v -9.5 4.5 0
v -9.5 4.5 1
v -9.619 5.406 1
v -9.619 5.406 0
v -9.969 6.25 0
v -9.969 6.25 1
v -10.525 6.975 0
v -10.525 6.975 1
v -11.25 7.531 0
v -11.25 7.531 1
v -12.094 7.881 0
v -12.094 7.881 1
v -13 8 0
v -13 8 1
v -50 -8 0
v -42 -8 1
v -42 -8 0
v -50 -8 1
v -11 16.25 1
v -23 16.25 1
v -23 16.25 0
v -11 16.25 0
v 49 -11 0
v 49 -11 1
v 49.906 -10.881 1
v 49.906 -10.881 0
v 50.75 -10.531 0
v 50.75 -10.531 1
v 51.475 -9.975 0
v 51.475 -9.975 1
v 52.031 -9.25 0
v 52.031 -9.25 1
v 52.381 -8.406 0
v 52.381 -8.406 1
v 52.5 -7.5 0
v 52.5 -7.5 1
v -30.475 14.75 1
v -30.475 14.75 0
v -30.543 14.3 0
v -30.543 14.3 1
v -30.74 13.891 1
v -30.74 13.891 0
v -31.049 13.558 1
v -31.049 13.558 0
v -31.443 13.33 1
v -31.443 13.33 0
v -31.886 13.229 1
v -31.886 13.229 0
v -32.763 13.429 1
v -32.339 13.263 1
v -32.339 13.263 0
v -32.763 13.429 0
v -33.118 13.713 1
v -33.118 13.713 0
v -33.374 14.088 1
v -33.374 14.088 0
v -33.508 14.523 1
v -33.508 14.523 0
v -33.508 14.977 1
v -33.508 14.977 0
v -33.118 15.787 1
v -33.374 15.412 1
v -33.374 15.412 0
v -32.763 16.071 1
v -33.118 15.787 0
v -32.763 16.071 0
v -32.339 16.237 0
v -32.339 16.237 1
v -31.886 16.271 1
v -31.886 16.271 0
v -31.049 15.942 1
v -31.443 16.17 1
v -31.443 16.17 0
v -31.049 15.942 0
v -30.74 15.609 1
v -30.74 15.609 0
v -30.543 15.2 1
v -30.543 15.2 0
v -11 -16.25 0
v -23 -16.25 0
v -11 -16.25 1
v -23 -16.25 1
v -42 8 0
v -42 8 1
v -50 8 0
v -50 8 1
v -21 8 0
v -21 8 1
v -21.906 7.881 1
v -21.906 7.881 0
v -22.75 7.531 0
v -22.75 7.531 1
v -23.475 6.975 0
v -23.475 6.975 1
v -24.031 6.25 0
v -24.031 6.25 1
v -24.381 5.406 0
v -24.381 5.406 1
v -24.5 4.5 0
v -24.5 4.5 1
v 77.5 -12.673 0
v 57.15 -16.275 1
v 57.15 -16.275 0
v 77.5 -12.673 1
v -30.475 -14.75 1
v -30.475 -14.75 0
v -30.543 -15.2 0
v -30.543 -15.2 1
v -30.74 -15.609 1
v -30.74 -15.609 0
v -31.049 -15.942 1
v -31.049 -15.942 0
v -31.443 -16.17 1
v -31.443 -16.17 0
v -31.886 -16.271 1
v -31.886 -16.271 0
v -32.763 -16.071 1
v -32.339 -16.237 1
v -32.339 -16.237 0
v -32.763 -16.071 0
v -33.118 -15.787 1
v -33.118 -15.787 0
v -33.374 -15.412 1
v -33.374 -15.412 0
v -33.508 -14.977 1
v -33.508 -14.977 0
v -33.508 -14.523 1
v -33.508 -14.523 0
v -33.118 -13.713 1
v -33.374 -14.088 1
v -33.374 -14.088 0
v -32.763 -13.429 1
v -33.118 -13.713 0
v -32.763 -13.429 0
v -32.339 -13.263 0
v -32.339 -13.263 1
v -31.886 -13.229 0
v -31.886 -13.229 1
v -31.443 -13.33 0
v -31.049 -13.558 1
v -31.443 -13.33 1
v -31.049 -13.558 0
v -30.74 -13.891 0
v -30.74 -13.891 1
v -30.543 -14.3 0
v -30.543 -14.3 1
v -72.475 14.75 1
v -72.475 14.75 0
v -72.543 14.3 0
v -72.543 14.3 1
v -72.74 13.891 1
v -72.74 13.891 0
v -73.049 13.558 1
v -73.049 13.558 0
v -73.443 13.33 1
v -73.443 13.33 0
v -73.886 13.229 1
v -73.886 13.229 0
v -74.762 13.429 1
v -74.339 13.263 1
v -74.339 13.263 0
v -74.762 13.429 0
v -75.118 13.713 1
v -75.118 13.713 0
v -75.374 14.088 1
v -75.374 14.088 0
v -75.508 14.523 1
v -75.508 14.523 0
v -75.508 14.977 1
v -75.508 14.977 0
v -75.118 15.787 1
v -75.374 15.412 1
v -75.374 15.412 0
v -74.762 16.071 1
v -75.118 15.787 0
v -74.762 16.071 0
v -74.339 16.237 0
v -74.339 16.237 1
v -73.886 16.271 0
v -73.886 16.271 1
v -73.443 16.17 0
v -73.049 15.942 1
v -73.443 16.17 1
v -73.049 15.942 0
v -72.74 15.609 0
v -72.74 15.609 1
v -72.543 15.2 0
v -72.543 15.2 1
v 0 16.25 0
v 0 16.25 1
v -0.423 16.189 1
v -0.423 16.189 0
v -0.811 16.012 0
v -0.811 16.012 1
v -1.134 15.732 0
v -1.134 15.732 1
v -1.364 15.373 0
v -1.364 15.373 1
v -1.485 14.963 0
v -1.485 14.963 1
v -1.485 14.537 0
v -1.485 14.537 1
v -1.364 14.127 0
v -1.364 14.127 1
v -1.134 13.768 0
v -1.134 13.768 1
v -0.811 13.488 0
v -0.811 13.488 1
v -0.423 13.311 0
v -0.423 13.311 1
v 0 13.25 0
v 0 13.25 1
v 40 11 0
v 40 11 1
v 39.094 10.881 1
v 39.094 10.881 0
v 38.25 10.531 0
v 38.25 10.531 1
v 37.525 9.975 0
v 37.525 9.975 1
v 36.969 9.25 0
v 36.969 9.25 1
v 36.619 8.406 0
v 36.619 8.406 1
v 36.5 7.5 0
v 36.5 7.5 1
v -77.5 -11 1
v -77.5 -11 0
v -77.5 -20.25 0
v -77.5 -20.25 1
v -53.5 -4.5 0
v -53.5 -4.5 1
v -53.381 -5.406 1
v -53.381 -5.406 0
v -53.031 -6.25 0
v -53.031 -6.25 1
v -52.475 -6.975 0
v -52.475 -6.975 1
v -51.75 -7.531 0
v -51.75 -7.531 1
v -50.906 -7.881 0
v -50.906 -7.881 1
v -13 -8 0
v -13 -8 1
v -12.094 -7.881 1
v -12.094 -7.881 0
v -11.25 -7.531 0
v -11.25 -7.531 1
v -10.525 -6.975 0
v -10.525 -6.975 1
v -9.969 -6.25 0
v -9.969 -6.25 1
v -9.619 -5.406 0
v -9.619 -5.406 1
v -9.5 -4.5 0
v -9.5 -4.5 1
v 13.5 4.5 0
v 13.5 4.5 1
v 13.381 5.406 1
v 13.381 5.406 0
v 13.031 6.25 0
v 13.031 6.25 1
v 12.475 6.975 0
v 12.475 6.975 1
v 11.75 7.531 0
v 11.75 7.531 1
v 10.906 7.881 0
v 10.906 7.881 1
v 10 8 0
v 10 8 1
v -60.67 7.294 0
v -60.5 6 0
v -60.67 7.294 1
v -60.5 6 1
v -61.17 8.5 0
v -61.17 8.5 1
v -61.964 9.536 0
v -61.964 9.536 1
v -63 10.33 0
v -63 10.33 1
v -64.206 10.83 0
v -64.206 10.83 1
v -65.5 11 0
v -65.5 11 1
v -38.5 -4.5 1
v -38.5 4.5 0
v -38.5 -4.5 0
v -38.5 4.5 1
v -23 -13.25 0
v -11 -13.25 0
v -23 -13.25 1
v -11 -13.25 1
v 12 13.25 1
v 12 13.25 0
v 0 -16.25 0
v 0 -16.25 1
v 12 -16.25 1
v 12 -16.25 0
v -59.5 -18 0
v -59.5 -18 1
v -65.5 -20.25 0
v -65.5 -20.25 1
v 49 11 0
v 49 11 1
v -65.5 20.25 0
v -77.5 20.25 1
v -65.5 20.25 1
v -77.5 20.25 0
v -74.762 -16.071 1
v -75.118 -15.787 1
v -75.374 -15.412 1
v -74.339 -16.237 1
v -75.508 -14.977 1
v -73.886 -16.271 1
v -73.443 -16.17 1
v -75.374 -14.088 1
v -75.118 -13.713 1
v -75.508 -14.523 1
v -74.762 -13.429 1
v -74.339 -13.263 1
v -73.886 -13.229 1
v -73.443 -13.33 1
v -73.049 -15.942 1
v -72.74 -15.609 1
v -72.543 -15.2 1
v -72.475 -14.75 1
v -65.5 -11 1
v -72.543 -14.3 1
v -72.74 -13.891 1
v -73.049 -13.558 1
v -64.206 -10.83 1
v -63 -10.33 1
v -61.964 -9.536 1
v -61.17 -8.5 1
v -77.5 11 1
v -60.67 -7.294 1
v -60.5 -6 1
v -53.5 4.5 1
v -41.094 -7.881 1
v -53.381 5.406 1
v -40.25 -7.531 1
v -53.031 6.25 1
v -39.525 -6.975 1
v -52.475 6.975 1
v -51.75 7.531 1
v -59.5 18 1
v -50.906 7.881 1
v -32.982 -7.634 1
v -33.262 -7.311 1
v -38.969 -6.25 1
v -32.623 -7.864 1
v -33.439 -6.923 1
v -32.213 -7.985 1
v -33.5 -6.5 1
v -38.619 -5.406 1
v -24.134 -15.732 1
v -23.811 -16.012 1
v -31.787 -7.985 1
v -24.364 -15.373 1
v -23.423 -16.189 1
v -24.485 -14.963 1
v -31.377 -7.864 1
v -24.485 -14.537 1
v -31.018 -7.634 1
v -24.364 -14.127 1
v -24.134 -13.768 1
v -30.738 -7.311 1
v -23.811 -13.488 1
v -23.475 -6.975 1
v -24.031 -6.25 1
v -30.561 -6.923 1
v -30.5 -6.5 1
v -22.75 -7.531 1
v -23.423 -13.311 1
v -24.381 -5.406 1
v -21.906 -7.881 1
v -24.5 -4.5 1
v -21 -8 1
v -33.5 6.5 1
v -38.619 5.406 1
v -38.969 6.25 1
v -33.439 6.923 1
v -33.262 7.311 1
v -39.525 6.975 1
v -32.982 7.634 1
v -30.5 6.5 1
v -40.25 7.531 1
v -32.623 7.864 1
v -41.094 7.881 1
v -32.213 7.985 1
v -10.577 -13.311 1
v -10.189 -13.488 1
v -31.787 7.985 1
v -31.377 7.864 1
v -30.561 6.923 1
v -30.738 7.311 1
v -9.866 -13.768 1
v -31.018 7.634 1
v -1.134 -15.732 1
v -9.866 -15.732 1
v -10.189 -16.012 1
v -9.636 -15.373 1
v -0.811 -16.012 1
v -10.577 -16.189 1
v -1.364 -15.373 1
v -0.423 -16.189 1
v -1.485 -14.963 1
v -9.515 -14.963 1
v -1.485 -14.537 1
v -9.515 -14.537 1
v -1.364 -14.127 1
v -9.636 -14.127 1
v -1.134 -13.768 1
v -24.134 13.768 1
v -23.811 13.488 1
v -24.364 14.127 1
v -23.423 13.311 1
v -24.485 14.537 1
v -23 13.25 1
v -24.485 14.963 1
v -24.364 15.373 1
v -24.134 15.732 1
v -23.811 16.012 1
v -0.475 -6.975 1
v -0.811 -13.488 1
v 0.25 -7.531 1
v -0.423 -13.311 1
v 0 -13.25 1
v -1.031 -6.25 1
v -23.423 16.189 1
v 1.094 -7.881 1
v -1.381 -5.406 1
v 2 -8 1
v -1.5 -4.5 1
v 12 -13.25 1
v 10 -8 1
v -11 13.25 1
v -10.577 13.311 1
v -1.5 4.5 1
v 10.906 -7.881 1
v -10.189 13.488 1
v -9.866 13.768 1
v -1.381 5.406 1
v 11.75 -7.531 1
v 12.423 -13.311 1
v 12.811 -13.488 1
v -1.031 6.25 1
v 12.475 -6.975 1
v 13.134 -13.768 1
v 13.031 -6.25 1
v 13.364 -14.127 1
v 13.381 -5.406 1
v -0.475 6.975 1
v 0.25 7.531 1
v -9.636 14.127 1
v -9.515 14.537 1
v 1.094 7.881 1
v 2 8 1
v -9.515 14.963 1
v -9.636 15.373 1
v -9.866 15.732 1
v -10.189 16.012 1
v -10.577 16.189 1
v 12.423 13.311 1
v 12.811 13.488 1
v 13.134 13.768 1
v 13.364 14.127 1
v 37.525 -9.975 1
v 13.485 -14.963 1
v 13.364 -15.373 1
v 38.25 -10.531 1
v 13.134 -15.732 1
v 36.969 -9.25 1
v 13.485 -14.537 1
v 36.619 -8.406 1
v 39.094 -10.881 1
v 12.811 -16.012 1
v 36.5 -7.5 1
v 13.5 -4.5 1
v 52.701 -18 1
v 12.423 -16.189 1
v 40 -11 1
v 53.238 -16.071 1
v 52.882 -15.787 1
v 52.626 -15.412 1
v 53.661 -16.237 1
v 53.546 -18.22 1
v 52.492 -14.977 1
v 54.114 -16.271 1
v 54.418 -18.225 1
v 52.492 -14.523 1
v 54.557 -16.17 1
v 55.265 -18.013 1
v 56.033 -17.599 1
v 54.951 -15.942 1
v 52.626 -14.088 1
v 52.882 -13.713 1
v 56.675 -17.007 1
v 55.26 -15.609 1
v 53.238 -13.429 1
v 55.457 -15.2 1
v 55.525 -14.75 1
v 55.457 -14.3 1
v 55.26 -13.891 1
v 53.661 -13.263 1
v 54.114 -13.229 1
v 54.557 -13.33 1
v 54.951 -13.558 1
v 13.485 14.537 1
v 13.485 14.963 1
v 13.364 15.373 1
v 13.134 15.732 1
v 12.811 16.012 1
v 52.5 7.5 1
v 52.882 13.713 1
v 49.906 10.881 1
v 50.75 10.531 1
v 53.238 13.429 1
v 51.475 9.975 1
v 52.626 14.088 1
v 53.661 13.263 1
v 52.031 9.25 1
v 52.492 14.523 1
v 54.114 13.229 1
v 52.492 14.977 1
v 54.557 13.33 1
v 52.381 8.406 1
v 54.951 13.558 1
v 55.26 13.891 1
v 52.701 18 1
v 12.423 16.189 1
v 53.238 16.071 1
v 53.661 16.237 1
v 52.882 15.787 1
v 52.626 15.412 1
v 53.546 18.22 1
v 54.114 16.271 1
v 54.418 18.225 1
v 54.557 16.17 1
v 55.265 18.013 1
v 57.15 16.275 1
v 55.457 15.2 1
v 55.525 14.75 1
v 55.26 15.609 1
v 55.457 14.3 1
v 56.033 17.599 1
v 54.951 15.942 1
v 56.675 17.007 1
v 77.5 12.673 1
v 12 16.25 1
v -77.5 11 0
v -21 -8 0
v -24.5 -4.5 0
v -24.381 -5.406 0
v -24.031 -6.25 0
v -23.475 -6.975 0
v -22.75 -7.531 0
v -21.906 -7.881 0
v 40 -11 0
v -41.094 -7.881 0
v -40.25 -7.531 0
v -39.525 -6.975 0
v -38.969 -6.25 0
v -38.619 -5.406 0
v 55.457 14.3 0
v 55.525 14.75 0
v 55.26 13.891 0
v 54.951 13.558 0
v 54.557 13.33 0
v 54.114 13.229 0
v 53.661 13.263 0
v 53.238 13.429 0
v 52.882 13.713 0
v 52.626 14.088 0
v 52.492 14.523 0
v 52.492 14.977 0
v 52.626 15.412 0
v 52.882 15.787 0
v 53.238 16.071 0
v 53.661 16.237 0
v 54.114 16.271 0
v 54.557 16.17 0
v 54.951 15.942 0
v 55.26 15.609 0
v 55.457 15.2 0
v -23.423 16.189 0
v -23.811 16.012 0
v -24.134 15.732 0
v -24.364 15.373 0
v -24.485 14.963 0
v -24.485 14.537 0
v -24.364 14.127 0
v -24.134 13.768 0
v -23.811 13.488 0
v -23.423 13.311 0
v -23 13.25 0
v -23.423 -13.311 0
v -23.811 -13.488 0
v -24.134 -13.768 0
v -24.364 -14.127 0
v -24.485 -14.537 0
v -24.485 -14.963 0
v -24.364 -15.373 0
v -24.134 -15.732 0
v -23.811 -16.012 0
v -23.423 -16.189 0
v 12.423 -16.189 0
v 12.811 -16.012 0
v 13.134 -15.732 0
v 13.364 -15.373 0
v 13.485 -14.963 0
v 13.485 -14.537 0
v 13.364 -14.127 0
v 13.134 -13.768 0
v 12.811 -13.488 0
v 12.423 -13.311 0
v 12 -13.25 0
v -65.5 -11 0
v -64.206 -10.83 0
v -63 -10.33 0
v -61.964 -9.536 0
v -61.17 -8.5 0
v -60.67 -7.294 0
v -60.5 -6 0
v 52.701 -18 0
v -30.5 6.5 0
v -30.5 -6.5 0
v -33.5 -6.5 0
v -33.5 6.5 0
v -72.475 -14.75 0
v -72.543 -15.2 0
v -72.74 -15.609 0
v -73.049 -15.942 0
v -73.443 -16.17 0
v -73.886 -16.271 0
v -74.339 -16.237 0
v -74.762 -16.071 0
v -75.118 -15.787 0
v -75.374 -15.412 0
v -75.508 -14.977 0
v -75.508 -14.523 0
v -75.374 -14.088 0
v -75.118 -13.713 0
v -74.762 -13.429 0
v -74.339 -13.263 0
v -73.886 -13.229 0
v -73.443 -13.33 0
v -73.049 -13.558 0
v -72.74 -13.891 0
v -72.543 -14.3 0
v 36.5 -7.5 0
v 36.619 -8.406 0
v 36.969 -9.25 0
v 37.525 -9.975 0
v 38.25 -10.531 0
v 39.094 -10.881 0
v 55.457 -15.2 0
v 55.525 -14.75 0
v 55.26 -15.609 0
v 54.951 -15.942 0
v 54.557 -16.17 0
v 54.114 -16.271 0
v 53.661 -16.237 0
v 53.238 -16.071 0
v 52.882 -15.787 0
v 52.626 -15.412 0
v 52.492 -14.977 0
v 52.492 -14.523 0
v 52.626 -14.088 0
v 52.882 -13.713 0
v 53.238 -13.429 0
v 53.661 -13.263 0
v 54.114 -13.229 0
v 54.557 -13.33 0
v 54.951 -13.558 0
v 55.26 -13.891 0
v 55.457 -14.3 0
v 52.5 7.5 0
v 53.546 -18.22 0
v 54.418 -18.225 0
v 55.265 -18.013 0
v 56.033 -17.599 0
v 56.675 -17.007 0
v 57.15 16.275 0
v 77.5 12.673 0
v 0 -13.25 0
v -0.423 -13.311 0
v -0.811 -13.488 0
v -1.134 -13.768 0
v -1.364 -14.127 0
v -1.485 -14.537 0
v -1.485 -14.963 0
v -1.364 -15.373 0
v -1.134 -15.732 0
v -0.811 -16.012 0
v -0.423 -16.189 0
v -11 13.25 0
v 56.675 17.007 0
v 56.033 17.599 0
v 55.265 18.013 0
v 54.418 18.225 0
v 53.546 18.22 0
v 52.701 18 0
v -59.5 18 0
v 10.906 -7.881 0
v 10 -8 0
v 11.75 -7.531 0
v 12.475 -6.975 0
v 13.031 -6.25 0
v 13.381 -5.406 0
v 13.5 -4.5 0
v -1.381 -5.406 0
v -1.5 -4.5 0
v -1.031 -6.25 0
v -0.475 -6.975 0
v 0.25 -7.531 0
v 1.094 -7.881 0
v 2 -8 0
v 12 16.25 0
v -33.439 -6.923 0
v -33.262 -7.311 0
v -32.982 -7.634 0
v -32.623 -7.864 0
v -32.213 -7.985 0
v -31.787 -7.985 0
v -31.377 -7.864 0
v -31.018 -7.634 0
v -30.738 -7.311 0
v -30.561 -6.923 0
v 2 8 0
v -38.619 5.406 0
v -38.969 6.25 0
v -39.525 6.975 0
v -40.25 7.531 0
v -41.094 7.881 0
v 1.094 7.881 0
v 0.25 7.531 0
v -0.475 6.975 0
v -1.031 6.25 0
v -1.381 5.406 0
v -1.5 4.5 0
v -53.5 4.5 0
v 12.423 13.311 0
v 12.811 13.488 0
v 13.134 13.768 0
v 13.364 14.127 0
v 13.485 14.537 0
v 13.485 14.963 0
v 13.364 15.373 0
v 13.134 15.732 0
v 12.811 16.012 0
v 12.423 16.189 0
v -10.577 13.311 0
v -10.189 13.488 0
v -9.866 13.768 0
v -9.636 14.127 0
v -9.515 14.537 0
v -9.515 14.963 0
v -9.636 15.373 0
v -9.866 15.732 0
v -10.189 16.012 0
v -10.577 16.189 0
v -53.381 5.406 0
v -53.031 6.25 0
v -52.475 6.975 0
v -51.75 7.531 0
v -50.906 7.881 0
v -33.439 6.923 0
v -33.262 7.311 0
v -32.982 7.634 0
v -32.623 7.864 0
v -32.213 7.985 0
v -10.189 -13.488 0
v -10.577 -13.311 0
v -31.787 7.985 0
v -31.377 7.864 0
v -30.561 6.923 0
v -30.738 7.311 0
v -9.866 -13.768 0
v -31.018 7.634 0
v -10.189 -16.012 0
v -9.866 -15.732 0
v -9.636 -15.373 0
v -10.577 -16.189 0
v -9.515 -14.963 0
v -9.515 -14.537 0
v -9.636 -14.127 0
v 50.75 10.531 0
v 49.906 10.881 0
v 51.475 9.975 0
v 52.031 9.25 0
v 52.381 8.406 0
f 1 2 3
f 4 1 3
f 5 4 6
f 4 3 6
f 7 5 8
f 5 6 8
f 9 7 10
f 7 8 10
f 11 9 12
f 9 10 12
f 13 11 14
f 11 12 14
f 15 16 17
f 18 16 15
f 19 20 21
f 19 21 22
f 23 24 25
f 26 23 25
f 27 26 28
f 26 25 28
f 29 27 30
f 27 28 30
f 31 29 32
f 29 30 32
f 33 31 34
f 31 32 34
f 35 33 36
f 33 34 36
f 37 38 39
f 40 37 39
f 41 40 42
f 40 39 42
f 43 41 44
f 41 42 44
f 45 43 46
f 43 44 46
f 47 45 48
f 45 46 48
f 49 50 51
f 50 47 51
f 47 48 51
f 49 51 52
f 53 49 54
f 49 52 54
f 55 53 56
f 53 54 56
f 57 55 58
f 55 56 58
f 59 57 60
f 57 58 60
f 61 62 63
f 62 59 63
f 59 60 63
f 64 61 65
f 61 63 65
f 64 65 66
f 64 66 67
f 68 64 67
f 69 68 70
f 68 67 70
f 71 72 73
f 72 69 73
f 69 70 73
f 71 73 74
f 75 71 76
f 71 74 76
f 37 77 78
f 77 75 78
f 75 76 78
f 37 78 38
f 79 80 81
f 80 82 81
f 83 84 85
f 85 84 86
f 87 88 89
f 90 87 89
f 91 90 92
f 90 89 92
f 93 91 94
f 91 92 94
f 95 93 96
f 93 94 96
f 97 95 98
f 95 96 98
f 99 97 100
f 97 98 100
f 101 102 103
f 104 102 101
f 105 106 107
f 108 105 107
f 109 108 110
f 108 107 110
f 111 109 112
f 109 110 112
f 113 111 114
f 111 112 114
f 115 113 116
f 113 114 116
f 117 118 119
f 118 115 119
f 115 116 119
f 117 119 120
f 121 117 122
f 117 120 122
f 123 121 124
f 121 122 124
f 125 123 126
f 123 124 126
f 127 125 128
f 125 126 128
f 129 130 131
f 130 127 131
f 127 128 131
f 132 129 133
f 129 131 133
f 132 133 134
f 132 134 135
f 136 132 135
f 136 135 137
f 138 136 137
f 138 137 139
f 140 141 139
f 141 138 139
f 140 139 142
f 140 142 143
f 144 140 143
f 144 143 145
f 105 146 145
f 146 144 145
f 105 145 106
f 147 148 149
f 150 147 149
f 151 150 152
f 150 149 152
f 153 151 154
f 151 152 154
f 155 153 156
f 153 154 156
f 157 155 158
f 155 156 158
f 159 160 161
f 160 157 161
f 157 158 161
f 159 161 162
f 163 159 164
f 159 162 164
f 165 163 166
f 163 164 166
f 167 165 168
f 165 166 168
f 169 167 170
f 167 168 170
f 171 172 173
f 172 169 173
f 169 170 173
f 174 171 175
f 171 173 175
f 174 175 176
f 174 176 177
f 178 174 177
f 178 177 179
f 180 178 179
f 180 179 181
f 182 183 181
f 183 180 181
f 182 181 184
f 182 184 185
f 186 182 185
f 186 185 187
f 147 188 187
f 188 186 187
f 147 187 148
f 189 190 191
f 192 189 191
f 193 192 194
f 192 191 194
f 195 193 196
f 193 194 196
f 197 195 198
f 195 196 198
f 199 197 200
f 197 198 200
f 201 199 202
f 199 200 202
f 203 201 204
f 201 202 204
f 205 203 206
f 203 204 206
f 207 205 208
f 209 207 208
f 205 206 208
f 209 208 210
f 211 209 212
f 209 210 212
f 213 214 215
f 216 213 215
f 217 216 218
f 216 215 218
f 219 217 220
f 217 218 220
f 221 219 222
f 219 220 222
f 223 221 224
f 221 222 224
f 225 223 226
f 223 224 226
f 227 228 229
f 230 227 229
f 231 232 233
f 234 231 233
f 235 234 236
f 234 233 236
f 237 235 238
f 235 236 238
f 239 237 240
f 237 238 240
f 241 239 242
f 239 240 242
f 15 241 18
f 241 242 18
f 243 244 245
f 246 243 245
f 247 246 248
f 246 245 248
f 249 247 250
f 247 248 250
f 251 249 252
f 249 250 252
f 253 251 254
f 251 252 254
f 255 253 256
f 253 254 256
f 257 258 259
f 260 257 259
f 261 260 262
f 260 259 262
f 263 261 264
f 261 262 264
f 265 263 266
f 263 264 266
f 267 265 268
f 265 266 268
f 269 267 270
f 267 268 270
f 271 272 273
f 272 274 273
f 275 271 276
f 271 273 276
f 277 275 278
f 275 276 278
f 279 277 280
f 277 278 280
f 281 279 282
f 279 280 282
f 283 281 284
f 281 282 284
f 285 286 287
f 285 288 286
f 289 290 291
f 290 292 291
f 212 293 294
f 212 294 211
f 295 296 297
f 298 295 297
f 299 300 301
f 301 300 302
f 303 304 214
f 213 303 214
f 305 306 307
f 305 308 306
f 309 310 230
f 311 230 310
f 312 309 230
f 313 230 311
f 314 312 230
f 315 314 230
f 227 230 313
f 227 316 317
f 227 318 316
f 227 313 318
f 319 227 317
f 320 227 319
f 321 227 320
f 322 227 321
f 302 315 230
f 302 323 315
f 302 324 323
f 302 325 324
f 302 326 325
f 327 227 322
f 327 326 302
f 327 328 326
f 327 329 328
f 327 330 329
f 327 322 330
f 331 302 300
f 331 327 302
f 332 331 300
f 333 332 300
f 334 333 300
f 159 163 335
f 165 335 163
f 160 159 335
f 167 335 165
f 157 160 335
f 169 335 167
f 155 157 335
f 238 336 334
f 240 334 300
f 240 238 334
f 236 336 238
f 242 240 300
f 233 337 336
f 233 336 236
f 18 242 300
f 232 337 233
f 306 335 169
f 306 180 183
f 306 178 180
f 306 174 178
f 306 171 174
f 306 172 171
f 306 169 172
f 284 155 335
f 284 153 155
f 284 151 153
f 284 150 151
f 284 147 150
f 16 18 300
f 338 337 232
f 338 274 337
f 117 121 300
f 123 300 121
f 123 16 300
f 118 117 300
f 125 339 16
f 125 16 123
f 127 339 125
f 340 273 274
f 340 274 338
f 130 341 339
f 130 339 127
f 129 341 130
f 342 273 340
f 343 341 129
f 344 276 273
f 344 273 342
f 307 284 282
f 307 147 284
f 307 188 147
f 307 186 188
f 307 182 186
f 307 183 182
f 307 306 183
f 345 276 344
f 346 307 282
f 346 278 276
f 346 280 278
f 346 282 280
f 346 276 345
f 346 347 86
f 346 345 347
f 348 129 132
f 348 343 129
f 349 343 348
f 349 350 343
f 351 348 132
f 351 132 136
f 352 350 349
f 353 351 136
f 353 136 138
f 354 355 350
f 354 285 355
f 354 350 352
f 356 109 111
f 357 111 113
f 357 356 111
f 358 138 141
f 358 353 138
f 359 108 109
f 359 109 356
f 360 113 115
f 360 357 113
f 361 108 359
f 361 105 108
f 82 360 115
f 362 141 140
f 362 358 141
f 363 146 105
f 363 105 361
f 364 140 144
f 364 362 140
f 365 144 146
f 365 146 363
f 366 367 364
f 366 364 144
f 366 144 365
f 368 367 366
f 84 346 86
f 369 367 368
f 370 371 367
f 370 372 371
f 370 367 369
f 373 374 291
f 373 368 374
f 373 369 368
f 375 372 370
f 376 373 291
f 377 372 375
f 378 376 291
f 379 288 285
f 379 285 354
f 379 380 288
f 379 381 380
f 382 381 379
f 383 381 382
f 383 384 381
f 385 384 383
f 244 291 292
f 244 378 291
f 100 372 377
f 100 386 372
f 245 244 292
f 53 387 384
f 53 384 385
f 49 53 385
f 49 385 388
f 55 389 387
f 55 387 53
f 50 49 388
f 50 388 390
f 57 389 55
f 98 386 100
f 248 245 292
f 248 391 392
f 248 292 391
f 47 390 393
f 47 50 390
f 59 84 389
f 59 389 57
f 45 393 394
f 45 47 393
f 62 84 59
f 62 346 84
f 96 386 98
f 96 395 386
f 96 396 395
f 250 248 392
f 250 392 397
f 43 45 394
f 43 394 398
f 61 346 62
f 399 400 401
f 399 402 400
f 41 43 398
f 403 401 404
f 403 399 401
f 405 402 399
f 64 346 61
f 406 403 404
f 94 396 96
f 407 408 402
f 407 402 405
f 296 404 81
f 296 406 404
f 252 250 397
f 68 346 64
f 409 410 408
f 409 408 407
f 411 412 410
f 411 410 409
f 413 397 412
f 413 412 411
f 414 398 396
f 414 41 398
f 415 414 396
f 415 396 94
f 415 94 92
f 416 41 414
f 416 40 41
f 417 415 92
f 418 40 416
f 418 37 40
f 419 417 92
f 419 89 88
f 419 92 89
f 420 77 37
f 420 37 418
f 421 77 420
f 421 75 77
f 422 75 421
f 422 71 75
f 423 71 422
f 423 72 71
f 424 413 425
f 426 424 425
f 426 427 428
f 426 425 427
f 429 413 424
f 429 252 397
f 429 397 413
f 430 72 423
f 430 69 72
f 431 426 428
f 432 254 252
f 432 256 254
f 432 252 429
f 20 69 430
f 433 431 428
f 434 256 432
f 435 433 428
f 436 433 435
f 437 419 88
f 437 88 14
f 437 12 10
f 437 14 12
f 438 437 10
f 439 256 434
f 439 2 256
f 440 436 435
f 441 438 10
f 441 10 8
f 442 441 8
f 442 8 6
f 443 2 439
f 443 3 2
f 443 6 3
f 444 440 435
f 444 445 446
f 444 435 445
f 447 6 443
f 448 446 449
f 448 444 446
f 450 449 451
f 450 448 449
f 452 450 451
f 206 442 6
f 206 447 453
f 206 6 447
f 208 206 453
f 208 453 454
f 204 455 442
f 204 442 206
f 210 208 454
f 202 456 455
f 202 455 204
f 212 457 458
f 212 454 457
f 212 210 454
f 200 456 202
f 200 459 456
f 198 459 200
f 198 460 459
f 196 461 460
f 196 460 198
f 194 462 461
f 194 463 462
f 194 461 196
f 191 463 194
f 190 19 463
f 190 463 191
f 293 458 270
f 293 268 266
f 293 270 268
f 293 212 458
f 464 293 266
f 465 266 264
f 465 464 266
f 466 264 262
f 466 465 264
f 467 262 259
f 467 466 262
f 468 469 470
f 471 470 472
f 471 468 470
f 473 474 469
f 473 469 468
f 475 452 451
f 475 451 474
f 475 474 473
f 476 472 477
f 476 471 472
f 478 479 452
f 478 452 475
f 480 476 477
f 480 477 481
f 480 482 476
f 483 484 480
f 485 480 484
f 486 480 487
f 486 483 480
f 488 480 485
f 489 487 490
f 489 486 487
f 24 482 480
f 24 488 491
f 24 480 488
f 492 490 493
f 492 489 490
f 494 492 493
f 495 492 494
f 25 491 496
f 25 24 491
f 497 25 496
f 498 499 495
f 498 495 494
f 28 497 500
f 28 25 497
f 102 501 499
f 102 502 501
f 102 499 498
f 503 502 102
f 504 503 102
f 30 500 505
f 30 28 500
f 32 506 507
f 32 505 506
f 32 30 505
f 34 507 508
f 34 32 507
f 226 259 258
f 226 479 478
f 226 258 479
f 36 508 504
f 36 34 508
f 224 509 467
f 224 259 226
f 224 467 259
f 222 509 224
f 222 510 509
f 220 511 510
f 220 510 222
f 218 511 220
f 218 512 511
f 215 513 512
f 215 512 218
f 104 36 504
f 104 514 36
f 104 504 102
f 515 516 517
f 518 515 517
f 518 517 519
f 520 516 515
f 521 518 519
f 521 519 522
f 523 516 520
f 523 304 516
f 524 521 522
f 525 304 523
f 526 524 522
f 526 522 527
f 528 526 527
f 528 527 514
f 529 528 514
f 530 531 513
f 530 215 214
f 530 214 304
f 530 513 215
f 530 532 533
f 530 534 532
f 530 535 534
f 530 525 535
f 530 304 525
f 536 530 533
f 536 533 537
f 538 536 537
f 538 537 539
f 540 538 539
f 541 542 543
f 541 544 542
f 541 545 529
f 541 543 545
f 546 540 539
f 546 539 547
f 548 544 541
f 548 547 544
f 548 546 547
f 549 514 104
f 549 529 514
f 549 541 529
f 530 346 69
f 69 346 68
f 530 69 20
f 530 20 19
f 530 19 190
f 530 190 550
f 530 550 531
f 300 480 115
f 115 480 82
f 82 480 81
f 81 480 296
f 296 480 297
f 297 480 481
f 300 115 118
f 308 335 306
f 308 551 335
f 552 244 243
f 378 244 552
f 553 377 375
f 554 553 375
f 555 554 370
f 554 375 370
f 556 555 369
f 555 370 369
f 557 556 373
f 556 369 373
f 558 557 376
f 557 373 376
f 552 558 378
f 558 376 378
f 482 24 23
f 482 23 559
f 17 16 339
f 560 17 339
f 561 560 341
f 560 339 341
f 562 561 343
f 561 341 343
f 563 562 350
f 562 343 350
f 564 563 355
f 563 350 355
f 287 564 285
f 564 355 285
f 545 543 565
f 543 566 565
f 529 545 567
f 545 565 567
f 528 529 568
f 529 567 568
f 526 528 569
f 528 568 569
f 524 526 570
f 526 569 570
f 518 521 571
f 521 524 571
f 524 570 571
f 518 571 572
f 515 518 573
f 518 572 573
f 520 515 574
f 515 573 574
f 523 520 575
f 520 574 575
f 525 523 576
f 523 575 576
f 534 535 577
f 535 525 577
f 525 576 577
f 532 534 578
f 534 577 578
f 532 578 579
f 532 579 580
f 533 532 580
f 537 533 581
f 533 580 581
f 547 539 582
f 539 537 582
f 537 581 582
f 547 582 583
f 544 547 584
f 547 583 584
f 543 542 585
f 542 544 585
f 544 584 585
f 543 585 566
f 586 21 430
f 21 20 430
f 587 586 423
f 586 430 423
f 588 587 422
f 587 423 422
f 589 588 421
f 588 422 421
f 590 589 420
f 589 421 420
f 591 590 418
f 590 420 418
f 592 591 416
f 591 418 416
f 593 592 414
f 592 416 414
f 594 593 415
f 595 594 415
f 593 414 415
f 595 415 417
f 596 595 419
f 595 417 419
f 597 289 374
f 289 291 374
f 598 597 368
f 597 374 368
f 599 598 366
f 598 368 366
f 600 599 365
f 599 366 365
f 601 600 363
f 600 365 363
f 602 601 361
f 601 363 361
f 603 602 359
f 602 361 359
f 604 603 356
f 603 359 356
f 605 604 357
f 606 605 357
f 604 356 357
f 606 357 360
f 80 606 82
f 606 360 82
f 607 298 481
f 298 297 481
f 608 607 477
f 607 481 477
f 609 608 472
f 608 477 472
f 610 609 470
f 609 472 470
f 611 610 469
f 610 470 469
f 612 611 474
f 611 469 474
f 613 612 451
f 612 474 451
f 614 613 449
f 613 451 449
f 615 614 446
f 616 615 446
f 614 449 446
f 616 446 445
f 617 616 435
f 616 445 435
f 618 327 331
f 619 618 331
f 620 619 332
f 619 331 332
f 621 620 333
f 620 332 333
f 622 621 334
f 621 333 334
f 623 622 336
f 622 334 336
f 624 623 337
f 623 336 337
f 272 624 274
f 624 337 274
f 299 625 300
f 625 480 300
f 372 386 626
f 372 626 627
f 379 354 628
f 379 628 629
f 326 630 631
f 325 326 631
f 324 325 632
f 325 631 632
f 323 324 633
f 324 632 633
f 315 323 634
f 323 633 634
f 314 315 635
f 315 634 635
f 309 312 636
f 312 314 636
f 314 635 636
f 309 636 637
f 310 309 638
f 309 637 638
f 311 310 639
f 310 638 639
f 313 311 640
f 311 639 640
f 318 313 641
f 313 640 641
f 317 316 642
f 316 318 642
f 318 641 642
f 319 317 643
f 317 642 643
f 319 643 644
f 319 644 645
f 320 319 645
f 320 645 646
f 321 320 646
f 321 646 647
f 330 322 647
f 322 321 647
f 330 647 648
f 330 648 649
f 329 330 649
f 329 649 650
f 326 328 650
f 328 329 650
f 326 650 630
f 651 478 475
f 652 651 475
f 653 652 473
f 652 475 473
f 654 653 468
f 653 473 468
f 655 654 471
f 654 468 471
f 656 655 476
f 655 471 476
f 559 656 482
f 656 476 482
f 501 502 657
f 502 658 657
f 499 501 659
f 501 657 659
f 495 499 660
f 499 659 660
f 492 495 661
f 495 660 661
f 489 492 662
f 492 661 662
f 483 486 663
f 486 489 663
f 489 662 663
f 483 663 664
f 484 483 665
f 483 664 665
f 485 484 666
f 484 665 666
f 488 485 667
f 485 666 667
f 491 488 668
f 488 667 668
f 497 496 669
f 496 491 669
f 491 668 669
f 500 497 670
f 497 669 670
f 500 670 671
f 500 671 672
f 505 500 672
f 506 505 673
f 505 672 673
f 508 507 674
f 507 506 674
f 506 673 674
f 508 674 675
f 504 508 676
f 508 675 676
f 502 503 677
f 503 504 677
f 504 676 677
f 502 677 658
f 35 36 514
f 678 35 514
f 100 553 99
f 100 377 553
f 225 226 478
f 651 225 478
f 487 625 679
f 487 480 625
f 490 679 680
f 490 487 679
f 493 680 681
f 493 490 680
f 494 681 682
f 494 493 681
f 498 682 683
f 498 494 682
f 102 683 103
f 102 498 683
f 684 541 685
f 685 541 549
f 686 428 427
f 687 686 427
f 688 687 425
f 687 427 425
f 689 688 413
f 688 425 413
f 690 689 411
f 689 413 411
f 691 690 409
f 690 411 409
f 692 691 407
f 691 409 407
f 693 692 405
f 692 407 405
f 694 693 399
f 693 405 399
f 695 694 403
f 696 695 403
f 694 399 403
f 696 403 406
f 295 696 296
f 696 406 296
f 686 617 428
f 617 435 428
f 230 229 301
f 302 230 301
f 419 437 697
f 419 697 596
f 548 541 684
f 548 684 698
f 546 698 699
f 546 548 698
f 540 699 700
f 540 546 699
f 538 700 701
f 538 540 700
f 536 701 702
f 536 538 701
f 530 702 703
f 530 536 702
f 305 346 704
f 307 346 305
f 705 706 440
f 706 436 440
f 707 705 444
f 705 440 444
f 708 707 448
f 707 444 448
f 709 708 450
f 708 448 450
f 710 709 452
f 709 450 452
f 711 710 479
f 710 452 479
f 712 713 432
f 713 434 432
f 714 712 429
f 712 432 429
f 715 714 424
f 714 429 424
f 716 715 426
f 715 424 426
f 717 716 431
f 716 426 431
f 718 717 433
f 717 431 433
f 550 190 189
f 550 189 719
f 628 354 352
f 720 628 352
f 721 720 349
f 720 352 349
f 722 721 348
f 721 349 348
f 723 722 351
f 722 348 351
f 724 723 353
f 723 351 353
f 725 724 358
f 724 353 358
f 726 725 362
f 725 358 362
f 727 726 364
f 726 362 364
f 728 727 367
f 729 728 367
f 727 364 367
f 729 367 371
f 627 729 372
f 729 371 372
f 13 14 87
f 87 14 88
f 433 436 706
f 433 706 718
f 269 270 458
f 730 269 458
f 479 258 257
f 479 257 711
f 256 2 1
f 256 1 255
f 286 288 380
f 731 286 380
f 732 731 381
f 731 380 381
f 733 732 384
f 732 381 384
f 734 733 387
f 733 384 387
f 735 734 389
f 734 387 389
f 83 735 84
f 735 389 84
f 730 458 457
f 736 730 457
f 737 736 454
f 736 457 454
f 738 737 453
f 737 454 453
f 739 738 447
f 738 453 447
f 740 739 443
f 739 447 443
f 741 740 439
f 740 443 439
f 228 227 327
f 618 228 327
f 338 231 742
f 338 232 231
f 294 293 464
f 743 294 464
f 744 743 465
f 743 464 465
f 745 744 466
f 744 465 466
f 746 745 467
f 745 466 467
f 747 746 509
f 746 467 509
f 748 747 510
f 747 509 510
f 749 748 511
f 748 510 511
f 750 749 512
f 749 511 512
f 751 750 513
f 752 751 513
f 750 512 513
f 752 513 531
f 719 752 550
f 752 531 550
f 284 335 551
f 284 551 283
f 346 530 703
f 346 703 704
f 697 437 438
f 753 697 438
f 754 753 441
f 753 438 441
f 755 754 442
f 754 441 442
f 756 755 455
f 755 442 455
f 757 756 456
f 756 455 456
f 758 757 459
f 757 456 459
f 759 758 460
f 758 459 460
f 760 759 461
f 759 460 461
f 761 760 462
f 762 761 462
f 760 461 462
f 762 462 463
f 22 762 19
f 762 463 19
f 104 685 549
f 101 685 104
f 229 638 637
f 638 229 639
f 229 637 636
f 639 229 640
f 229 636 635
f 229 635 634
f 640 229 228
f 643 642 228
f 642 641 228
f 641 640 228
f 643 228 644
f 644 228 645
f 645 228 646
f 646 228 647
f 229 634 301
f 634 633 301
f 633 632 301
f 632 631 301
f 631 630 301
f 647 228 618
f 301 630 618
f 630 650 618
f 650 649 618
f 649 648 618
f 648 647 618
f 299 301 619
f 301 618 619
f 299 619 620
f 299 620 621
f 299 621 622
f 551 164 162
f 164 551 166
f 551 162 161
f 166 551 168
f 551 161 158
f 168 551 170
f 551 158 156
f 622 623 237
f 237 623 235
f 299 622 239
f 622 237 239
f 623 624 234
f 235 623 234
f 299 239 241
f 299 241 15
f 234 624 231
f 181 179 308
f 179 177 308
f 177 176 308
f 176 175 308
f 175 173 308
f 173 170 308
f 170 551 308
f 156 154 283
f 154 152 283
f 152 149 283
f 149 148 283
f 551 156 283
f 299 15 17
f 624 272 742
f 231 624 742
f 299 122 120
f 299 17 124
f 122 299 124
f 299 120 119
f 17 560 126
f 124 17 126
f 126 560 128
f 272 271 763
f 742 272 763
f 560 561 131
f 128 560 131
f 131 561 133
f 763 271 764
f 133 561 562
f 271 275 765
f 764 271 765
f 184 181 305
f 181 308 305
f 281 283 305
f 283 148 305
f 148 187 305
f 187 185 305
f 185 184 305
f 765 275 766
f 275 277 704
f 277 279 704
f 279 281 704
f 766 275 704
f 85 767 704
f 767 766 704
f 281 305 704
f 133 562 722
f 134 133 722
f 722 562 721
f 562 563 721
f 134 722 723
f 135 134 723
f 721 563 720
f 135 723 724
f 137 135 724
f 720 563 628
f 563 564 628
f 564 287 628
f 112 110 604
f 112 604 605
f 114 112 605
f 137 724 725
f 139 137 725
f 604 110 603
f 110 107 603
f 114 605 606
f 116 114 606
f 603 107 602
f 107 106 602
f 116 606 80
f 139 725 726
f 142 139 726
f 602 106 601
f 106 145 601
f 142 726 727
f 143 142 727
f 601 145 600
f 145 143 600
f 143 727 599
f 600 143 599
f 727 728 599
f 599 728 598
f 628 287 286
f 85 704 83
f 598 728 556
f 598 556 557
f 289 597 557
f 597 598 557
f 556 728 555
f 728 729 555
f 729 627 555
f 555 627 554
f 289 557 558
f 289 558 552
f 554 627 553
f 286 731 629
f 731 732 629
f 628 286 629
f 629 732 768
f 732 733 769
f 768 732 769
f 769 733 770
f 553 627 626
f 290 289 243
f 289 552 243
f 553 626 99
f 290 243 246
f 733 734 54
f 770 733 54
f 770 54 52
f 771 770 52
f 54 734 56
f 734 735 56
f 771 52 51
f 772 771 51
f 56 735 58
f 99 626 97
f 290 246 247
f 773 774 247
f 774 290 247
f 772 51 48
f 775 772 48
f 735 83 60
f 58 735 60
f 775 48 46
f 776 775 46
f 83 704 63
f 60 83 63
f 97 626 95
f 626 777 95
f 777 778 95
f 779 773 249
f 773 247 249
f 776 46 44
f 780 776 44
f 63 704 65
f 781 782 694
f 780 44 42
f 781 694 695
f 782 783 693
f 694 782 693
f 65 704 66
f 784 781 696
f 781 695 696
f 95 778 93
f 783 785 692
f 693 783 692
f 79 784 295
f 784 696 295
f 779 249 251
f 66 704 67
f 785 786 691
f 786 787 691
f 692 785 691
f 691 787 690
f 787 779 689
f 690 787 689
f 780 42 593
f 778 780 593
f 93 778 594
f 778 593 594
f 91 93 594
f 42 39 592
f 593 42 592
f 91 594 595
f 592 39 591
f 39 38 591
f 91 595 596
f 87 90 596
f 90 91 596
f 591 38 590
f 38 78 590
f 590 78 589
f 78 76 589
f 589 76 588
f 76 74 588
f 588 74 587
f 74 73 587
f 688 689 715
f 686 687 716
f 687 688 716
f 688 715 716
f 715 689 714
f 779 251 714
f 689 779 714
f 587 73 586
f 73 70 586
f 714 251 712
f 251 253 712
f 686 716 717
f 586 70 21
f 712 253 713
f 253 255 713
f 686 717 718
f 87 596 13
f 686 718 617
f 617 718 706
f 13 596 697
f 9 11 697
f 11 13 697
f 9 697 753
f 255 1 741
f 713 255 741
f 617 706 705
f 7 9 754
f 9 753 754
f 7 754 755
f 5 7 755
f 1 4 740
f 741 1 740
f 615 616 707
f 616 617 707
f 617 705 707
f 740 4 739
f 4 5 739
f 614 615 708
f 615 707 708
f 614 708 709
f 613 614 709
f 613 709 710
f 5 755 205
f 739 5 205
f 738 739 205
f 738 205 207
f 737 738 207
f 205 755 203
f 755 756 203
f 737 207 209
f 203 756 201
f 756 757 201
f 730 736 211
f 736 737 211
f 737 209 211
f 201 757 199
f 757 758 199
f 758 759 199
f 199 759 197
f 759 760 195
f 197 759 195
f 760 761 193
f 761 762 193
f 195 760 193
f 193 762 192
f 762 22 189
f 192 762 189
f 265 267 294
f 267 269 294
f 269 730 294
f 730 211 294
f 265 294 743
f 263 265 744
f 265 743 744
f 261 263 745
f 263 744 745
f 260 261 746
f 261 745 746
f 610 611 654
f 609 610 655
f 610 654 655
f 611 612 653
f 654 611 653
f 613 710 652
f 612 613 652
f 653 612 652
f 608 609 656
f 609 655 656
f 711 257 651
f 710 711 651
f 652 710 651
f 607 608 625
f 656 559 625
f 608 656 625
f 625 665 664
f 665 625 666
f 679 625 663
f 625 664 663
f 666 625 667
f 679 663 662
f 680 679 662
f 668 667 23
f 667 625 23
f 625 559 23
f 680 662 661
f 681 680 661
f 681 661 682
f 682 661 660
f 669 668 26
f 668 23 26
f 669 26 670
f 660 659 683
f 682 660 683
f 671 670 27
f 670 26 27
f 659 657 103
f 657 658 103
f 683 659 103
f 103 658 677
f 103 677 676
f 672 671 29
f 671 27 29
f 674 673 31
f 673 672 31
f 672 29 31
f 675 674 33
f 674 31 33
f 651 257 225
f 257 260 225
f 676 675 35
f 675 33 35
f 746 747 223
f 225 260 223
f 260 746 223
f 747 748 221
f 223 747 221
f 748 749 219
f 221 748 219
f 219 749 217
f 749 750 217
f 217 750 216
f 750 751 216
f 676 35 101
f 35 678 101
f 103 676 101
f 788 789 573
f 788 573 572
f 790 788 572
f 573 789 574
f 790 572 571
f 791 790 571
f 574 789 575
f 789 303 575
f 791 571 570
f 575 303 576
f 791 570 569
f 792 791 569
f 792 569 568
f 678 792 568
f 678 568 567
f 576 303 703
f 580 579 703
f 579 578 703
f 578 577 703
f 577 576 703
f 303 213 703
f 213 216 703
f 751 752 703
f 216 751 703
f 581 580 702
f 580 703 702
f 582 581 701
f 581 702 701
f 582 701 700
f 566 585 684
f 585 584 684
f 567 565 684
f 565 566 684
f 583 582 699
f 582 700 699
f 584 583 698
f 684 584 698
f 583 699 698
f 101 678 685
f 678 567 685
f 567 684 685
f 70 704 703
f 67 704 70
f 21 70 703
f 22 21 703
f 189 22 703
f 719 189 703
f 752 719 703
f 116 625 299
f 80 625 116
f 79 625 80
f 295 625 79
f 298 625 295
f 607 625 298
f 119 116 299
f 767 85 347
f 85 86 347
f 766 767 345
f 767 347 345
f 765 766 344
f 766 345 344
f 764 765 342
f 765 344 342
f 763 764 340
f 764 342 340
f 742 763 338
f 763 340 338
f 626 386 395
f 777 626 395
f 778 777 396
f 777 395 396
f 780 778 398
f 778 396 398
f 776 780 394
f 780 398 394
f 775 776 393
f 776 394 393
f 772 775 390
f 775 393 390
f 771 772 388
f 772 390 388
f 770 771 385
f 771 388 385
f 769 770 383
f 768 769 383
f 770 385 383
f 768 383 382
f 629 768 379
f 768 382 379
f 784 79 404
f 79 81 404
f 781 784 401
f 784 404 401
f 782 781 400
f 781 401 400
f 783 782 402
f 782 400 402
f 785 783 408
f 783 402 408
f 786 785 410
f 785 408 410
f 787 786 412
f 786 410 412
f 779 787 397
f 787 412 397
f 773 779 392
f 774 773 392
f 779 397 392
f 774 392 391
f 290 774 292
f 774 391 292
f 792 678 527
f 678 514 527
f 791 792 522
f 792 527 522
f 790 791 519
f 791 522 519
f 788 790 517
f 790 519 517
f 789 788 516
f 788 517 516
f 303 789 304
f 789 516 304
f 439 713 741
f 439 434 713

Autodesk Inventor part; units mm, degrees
ref_plane "YZ Plane" through (0, 0, 0) normal (1, 0, 0) x (0, 1, 0)
ref_plane "XZ Plane" through (0, 0, 0) normal (0, 1, 0) x (-1, 0, 0)
ref_plane "XY Plane" through (0, 0, 0) normal (0, 0, 1) x (1, 0, 0)
sketch "Sketch1" plane through (0, 0, 0) normal (0, 0, 1) x (1, 0, 0)
  line L0 (-74, 14.75) -> (54, 14.75) construction
  line L1 (-89.2201, 0) -> (135.4294, 0) construction
  circle A0 centre (-74, 14.75) radius 1.525
  circle A1 centre (-32, 14.75) radius 1.525
  circle A2 centre (54, 14.75) radius 1.525
  line L2 (-77.5, 0.7411) -> (-77.5, 20.25)
  line L3 (-77.5, 20.25) -> (77.5, 20.25)
  line L4 (77.5, 20.25) -> (77.5, 0)
  line L5 (-74, -14.75) -> (54, -14.75) construction
  circle A3 centre (-74, -14.75) radius 1.525
  circle A4 centre (-32, -14.75) radius 1.525
  circle A5 centre (54, -14.75) radius 1.525
  line L6 (-77.5, -0.7411) -> (-77.5, -20.25)
  line L7 (-77.5, -20.25) -> (77.5, -20.25)
  line L8 (77.5, -20.25) -> (77.5, 0)
  line L9 (-77.5, 0.7411) -> (-77.5, -0.7411)
  point P0 (0, 0)
  point P1 (0, 0)
  dimension "d2" = 3.05
  dimension "d3" = 3.05
  dimension "d4" = 3.05
  dimension "d6" = 42
  dimension "d7" = 86
  dimension "d127" = 20.25
  dimension "d129" = 155
  dimension "d130" = 77.5
  dimension "d131" = 3.5
extrude "Extrusion1" add sketch "Sketch1" along normal blind 1
sketch "Sketch5" plane through (0, 0, 1) normal (0, 0, 1) x (1, 0, 0)
  line L0 (-59.5, -18) -> (-65.5, -20.25)
  line L1 (-77.5, -11) -> (-65.5, -11)
  line L2 (0, 40.5196) -> (0, -40.5196) projected
  line L3 (-109.7892, 0) -> (116.2355, 0) projected
  line L4 (-60.5, -6) -> (-60.5, 0)
  arc A0 (-65.5, -11) -> (-60.5, -6) centre (-65.5, -6) ccw
  circle A1 centre (54, -14.75) radius 1.525 projected
  arc A2 (52.701, -18) -> (57.1503, -16.275) centre (54, -14.75) ccw
  line L5 (52.701, -18) -> (-59.5, -18)
  line L6 (57.1503, -16.275) -> (77.5, -12.6734)
  arc A3 (57.1503, -16.275) -> (52.701, -18) centre (54, -14.75) ccw construction
  line L7 (49, -11) -> (40, -11)
  line L8 (36.5, -7.5) -> (36.5, 0)
  line L9 (52.5, 0) -> (52.5, -7.5)
  line L10 (-42, -8) -> (-50, -8)
  line L11 (-53.5, -4.5) -> (-53.5, 0)
  line L12 (-38.5, 0) -> (-38.5, -4.5)
  line L13 (-30.5, 0) -> (-30.5, -6.5)
  line L14 (-33.5, -6.5) -> (-33.5, 0)
  arc A4 (-33.5, -6.5) -> (-30.5, -6.5) centre (-32, -6.5) ccw
  line L15 (-9.5, 0) -> (-9.5, -4.5)
  line L16 (-13, -8) -> (-21, -8)
  line L17 (-24.5, -4.5) -> (-24.5, 0)
  line L18 (10, -8) -> (2, -8)
  line L19 (-1.5, -4.5) -> (-1.5, 0)
  line L20 (13.5, 0) -> (13.5, -4.5)
  circle A5 centre (-32, -14.75) radius 1.525 construction
  line L21 (-32, -14.75) -> (15.7139, -14.75) construction
  circle A6 centre (-32, 14.75) radius 1.525 construction
  line L22 (-32, 14.75) -> (13.5, 14.75) construction
  line L23 (12, -28.9426) -> (12, 23.2337) construction
  line L24 (0, -27.2548) -> (0, 23.7474) construction
  line L25 (-11, -24.7597) -> (-11, 23.7474) construction
  line L26 (-23, -24.7597) -> (-23, 23.7474) construction
  line L27 (12, -14.75) -> (0, -14.75) construction
  line L28 (12, -13.25) -> (0, -13.25)
  line L29 (0, -16.25) -> (12, -16.25)
  arc A7 (12, -16.25) -> (12, -13.25) centre (12, -14.75) ccw
  arc A8 (0, -13.25) -> (0, -16.25) centre (0, -14.75) ccw
  line L30 (-11, -14.75) -> (-23, -14.75) construction
  line L31 (-11, -13.25) -> (-23, -13.25)
  line L32 (-23, -16.25) -> (-11, -16.25)
  arc A9 (-11, -16.25) -> (-11, -13.25) centre (-11, -14.75) ccw
  arc A10 (-23, -13.25) -> (-23, -16.25) centre (-23, -14.75) ccw
  arc A11 (49, -11) -> (52.5, -7.5) centre (49, -7.5) ccw
  arc A12 (36.5, -7.5) -> (40, -11) centre (40, -7.5) ccw
  arc A13 (10, -8) -> (13.5, -4.5) centre (10, -4.5) ccw
  arc A14 (-1.5, -4.5) -> (2, -8) centre (2, -4.5) ccw
  arc A15 (-13, -8) -> (-9.5, -4.5) centre (-13, -4.5) ccw
  arc A16 (-24.5, -4.5) -> (-21, -8) centre (-21, -4.5) ccw
  arc A17 (-42, -8) -> (-38.5, -4.5) centre (-42, -4.5) ccw
  arc A18 (-53.5, -4.5) -> (-50, -8) centre (-50, -4.5) ccw
  line L33 (-59.5, 18) -> (-65.5, 20.25)
  line L34 (-77.5, 11) -> (-65.5, 11)
  line L35 (-60.5, 6) -> (-60.5, 0)
  arc A19 (-60.5, 6) -> (-65.5, 11) centre (-65.5, 6) ccw
  circle A20 centre (54, 14.75) radius 1.525
  arc A21 (57.1503, 16.275) -> (52.701, 18) centre (54, 14.75) ccw
  line L36 (52.701, 18) -> (-59.5, 18)
  line L37 (57.1503, 16.275) -> (77.5, 12.6734)
  arc A22 (52.701, 18) -> (57.1503, 16.275) centre (54, 14.75) ccw construction
  line L38 (49, 11) -> (40, 11)
  line L39 (36.5, 7.5) -> (36.5, 0)
  line L40 (52.5, 0) -> (52.5, 7.5)
  line L41 (-42, 8) -> (-50, 8)
  line L42 (-53.5, 4.5) -> (-53.5, 0)
  line L43 (-38.5, 0) -> (-38.5, 4.5)
  line L44 (-30.5, 0) -> (-30.5, 6.5)
  line L45 (-33.5, 6.5) -> (-33.5, 0)
  arc A23 (-30.5, 6.5) -> (-33.5, 6.5) centre (-32, 6.5) ccw
  line L46 (-9.5, 0) -> (-9.5, 4.5)
  line L47 (-13, 8) -> (-21, 8)
  line L48 (-24.5, 4.5) -> (-24.5, 0)
  line L49 (10, 8) -> (2, 8)
  line L50 (-1.5, 4.5) -> (-1.5, 0)
  line L51 (13.5, 0) -> (13.5, 4.5)
  circle A24 centre (-32, 14.75) radius 1.525 construction
  line L52 (-32, 14.75) -> (15.7139, 14.75) construction
  line L53 (12, 14.75) -> (0, 14.75) construction
  line L54 (12, 13.25) -> (0, 13.25)
  line L55 (0, 16.25) -> (12, 16.25)
  arc A25 (12, 13.25) -> (12, 16.25) centre (12, 14.75) ccw
  arc A26 (0, 16.25) -> (0, 13.25) centre (0, 14.75) ccw
  line L56 (-11, 14.75) -> (-23, 14.75) construction
  line L57 (-11, 13.25) -> (-23, 13.25)
  line L58 (-23, 16.25) -> (-11, 16.25)
  arc A27 (-11, 13.25) -> (-11, 16.25) centre (-11, 14.75) ccw
  arc A28 (-23, 16.25) -> (-23, 13.25) centre (-23, 14.75) ccw
  arc A29 (52.5, 7.5) -> (49, 11) centre (49, 7.5) ccw
  arc A30 (40, 11) -> (36.5, 7.5) centre (40, 7.5) ccw
  arc A31 (13.5, 4.5) -> (10, 8) centre (10, 4.5) ccw
  arc A32 (2, 8) -> (-1.5, 4.5) centre (2, 4.5) ccw
  arc A33 (-9.5, 4.5) -> (-13, 8) centre (-13, 4.5) ccw
  arc A34 (-21, 8) -> (-24.5, 4.5) centre (-21, 4.5) ccw
  arc A35 (-38.5, 4.5) -> (-42, 8) centre (-42, 4.5) ccw
  arc A36 (-50, 8) -> (-53.5, 4.5) centre (-50, 4.5) ccw
  line L59 (77.5, -12.6734) -> (82.2803, -14.75)
  line L60 (82.2803, -14.75) -> (77.5, -28.9426)
  line L61 (77.5, -28.9426) -> (-65.5, -24.3901)
  line L62 (-65.5, -24.3901) -> (-65.5, -20.25)
  line L63 (77.5, 12.6734) -> (83.9462, 22.4701)
  line L64 (83.9462, 22.4701) -> (-65.5, 21.6624)
  line L65 (-65.5, 21.6624) -> (-65.5, 20.25)
  line L66 (-77.5, -11) -> (-77.5, 11)
  point P0 (0, 0)
  point P1 (-77.5, -20.25)
  point P2 (-77.5, 20.25)
  point P3 (52.5, -11)
  point P4 (36.5, -11)
  point P5 (-38.5, -8)
  point P6 (-53.5, -8)
  point P7 (-9.5, -8)
  point P8 (-24.5, -8)
  point P9 (-1.5, -8)
  point P10 (6, -14.75)
  point P11 (-17, -14.75)
  point P12 (52.5, 11)
  point P13 (36.5, 11)
  point P14 (-38.5, 8)
  point P15 (-53.5, 8)
  point P16 (-9.5, 8)
  point P17 (-24.5, 8)
  point P18 (-1.5, 8)
  point P19 (12, 28.9426)
  point P20 (0, 27.2548)
  point P21 (-11, 24.7597)
  point P22 (-23, 24.7597)
  point P23 (6, 14.75)
  point P24 (-17, 14.75)
  dimension "d133" = 12
  dimension "d135" = 11
  dimension "d137" = 5
  dimension "d138" = 7
  dimension "d139" = 97
  dimension "d140" = 16
  dimension "d141" = 8
  dimension "d142" = 7
  dimension "d143" = 15
  dimension "d144" = 3
  dimension "d147" = 6.5
  dimension "d148" = 15
  dimension "d149" = 8
  dimension "d150" = 36
  dimension "d151" = 15
  dimension "d152" = 8
  dimension "d153" = 59
  dimension "d154" = 27
  dimension "d155" = 6.5
  dimension "d156" = 1.5
  dimension "d157" = 1.5
  dimension "d158" = 1.5
  dimension "d159" = 1.5
  dimension "d161" = 3.5
extrude "Extrusion5" cut sketch "Sketch5" against normal through all contours L5 L2 L61 L62 L0 | L4 A0 L1 L66 L3 | L3 L66 L34 A19 L35 | L12 A17 L10 A18 L11 L3 | L3 L42 A36 L41 A35 L43 | L13 A4 L14 L3 | L3 L45 A23 L44 | L15 A15 L16 A16 L17 L3 | L3 L48 A34 L47 A33 L46 | L36 L33 L65 L64 L2 | L2 L64 L63 L37 A21 L36 | A26 L2 | L2 L55 A25 L54 | L39 A30 L38 A29 L40 L3 | L3 L9 A11 L7 A12 L8 | A14 L19 L3 L2 | L2 L3 L20 A13 L18 A14 | A8 L2 | L2 L28 A7 L29 | L5 A2 L6 L59 L60 L61 L2 | L3 L50 A32 L2 | L2 A32 L49 A31 L51 L3 | A9 L32 A10 L31 | L57 A28 L58 A27
equation "\"d3\" = d2"
equation "\"d4\" = d2"
properties part number "Top Plate" material "CFRP"
